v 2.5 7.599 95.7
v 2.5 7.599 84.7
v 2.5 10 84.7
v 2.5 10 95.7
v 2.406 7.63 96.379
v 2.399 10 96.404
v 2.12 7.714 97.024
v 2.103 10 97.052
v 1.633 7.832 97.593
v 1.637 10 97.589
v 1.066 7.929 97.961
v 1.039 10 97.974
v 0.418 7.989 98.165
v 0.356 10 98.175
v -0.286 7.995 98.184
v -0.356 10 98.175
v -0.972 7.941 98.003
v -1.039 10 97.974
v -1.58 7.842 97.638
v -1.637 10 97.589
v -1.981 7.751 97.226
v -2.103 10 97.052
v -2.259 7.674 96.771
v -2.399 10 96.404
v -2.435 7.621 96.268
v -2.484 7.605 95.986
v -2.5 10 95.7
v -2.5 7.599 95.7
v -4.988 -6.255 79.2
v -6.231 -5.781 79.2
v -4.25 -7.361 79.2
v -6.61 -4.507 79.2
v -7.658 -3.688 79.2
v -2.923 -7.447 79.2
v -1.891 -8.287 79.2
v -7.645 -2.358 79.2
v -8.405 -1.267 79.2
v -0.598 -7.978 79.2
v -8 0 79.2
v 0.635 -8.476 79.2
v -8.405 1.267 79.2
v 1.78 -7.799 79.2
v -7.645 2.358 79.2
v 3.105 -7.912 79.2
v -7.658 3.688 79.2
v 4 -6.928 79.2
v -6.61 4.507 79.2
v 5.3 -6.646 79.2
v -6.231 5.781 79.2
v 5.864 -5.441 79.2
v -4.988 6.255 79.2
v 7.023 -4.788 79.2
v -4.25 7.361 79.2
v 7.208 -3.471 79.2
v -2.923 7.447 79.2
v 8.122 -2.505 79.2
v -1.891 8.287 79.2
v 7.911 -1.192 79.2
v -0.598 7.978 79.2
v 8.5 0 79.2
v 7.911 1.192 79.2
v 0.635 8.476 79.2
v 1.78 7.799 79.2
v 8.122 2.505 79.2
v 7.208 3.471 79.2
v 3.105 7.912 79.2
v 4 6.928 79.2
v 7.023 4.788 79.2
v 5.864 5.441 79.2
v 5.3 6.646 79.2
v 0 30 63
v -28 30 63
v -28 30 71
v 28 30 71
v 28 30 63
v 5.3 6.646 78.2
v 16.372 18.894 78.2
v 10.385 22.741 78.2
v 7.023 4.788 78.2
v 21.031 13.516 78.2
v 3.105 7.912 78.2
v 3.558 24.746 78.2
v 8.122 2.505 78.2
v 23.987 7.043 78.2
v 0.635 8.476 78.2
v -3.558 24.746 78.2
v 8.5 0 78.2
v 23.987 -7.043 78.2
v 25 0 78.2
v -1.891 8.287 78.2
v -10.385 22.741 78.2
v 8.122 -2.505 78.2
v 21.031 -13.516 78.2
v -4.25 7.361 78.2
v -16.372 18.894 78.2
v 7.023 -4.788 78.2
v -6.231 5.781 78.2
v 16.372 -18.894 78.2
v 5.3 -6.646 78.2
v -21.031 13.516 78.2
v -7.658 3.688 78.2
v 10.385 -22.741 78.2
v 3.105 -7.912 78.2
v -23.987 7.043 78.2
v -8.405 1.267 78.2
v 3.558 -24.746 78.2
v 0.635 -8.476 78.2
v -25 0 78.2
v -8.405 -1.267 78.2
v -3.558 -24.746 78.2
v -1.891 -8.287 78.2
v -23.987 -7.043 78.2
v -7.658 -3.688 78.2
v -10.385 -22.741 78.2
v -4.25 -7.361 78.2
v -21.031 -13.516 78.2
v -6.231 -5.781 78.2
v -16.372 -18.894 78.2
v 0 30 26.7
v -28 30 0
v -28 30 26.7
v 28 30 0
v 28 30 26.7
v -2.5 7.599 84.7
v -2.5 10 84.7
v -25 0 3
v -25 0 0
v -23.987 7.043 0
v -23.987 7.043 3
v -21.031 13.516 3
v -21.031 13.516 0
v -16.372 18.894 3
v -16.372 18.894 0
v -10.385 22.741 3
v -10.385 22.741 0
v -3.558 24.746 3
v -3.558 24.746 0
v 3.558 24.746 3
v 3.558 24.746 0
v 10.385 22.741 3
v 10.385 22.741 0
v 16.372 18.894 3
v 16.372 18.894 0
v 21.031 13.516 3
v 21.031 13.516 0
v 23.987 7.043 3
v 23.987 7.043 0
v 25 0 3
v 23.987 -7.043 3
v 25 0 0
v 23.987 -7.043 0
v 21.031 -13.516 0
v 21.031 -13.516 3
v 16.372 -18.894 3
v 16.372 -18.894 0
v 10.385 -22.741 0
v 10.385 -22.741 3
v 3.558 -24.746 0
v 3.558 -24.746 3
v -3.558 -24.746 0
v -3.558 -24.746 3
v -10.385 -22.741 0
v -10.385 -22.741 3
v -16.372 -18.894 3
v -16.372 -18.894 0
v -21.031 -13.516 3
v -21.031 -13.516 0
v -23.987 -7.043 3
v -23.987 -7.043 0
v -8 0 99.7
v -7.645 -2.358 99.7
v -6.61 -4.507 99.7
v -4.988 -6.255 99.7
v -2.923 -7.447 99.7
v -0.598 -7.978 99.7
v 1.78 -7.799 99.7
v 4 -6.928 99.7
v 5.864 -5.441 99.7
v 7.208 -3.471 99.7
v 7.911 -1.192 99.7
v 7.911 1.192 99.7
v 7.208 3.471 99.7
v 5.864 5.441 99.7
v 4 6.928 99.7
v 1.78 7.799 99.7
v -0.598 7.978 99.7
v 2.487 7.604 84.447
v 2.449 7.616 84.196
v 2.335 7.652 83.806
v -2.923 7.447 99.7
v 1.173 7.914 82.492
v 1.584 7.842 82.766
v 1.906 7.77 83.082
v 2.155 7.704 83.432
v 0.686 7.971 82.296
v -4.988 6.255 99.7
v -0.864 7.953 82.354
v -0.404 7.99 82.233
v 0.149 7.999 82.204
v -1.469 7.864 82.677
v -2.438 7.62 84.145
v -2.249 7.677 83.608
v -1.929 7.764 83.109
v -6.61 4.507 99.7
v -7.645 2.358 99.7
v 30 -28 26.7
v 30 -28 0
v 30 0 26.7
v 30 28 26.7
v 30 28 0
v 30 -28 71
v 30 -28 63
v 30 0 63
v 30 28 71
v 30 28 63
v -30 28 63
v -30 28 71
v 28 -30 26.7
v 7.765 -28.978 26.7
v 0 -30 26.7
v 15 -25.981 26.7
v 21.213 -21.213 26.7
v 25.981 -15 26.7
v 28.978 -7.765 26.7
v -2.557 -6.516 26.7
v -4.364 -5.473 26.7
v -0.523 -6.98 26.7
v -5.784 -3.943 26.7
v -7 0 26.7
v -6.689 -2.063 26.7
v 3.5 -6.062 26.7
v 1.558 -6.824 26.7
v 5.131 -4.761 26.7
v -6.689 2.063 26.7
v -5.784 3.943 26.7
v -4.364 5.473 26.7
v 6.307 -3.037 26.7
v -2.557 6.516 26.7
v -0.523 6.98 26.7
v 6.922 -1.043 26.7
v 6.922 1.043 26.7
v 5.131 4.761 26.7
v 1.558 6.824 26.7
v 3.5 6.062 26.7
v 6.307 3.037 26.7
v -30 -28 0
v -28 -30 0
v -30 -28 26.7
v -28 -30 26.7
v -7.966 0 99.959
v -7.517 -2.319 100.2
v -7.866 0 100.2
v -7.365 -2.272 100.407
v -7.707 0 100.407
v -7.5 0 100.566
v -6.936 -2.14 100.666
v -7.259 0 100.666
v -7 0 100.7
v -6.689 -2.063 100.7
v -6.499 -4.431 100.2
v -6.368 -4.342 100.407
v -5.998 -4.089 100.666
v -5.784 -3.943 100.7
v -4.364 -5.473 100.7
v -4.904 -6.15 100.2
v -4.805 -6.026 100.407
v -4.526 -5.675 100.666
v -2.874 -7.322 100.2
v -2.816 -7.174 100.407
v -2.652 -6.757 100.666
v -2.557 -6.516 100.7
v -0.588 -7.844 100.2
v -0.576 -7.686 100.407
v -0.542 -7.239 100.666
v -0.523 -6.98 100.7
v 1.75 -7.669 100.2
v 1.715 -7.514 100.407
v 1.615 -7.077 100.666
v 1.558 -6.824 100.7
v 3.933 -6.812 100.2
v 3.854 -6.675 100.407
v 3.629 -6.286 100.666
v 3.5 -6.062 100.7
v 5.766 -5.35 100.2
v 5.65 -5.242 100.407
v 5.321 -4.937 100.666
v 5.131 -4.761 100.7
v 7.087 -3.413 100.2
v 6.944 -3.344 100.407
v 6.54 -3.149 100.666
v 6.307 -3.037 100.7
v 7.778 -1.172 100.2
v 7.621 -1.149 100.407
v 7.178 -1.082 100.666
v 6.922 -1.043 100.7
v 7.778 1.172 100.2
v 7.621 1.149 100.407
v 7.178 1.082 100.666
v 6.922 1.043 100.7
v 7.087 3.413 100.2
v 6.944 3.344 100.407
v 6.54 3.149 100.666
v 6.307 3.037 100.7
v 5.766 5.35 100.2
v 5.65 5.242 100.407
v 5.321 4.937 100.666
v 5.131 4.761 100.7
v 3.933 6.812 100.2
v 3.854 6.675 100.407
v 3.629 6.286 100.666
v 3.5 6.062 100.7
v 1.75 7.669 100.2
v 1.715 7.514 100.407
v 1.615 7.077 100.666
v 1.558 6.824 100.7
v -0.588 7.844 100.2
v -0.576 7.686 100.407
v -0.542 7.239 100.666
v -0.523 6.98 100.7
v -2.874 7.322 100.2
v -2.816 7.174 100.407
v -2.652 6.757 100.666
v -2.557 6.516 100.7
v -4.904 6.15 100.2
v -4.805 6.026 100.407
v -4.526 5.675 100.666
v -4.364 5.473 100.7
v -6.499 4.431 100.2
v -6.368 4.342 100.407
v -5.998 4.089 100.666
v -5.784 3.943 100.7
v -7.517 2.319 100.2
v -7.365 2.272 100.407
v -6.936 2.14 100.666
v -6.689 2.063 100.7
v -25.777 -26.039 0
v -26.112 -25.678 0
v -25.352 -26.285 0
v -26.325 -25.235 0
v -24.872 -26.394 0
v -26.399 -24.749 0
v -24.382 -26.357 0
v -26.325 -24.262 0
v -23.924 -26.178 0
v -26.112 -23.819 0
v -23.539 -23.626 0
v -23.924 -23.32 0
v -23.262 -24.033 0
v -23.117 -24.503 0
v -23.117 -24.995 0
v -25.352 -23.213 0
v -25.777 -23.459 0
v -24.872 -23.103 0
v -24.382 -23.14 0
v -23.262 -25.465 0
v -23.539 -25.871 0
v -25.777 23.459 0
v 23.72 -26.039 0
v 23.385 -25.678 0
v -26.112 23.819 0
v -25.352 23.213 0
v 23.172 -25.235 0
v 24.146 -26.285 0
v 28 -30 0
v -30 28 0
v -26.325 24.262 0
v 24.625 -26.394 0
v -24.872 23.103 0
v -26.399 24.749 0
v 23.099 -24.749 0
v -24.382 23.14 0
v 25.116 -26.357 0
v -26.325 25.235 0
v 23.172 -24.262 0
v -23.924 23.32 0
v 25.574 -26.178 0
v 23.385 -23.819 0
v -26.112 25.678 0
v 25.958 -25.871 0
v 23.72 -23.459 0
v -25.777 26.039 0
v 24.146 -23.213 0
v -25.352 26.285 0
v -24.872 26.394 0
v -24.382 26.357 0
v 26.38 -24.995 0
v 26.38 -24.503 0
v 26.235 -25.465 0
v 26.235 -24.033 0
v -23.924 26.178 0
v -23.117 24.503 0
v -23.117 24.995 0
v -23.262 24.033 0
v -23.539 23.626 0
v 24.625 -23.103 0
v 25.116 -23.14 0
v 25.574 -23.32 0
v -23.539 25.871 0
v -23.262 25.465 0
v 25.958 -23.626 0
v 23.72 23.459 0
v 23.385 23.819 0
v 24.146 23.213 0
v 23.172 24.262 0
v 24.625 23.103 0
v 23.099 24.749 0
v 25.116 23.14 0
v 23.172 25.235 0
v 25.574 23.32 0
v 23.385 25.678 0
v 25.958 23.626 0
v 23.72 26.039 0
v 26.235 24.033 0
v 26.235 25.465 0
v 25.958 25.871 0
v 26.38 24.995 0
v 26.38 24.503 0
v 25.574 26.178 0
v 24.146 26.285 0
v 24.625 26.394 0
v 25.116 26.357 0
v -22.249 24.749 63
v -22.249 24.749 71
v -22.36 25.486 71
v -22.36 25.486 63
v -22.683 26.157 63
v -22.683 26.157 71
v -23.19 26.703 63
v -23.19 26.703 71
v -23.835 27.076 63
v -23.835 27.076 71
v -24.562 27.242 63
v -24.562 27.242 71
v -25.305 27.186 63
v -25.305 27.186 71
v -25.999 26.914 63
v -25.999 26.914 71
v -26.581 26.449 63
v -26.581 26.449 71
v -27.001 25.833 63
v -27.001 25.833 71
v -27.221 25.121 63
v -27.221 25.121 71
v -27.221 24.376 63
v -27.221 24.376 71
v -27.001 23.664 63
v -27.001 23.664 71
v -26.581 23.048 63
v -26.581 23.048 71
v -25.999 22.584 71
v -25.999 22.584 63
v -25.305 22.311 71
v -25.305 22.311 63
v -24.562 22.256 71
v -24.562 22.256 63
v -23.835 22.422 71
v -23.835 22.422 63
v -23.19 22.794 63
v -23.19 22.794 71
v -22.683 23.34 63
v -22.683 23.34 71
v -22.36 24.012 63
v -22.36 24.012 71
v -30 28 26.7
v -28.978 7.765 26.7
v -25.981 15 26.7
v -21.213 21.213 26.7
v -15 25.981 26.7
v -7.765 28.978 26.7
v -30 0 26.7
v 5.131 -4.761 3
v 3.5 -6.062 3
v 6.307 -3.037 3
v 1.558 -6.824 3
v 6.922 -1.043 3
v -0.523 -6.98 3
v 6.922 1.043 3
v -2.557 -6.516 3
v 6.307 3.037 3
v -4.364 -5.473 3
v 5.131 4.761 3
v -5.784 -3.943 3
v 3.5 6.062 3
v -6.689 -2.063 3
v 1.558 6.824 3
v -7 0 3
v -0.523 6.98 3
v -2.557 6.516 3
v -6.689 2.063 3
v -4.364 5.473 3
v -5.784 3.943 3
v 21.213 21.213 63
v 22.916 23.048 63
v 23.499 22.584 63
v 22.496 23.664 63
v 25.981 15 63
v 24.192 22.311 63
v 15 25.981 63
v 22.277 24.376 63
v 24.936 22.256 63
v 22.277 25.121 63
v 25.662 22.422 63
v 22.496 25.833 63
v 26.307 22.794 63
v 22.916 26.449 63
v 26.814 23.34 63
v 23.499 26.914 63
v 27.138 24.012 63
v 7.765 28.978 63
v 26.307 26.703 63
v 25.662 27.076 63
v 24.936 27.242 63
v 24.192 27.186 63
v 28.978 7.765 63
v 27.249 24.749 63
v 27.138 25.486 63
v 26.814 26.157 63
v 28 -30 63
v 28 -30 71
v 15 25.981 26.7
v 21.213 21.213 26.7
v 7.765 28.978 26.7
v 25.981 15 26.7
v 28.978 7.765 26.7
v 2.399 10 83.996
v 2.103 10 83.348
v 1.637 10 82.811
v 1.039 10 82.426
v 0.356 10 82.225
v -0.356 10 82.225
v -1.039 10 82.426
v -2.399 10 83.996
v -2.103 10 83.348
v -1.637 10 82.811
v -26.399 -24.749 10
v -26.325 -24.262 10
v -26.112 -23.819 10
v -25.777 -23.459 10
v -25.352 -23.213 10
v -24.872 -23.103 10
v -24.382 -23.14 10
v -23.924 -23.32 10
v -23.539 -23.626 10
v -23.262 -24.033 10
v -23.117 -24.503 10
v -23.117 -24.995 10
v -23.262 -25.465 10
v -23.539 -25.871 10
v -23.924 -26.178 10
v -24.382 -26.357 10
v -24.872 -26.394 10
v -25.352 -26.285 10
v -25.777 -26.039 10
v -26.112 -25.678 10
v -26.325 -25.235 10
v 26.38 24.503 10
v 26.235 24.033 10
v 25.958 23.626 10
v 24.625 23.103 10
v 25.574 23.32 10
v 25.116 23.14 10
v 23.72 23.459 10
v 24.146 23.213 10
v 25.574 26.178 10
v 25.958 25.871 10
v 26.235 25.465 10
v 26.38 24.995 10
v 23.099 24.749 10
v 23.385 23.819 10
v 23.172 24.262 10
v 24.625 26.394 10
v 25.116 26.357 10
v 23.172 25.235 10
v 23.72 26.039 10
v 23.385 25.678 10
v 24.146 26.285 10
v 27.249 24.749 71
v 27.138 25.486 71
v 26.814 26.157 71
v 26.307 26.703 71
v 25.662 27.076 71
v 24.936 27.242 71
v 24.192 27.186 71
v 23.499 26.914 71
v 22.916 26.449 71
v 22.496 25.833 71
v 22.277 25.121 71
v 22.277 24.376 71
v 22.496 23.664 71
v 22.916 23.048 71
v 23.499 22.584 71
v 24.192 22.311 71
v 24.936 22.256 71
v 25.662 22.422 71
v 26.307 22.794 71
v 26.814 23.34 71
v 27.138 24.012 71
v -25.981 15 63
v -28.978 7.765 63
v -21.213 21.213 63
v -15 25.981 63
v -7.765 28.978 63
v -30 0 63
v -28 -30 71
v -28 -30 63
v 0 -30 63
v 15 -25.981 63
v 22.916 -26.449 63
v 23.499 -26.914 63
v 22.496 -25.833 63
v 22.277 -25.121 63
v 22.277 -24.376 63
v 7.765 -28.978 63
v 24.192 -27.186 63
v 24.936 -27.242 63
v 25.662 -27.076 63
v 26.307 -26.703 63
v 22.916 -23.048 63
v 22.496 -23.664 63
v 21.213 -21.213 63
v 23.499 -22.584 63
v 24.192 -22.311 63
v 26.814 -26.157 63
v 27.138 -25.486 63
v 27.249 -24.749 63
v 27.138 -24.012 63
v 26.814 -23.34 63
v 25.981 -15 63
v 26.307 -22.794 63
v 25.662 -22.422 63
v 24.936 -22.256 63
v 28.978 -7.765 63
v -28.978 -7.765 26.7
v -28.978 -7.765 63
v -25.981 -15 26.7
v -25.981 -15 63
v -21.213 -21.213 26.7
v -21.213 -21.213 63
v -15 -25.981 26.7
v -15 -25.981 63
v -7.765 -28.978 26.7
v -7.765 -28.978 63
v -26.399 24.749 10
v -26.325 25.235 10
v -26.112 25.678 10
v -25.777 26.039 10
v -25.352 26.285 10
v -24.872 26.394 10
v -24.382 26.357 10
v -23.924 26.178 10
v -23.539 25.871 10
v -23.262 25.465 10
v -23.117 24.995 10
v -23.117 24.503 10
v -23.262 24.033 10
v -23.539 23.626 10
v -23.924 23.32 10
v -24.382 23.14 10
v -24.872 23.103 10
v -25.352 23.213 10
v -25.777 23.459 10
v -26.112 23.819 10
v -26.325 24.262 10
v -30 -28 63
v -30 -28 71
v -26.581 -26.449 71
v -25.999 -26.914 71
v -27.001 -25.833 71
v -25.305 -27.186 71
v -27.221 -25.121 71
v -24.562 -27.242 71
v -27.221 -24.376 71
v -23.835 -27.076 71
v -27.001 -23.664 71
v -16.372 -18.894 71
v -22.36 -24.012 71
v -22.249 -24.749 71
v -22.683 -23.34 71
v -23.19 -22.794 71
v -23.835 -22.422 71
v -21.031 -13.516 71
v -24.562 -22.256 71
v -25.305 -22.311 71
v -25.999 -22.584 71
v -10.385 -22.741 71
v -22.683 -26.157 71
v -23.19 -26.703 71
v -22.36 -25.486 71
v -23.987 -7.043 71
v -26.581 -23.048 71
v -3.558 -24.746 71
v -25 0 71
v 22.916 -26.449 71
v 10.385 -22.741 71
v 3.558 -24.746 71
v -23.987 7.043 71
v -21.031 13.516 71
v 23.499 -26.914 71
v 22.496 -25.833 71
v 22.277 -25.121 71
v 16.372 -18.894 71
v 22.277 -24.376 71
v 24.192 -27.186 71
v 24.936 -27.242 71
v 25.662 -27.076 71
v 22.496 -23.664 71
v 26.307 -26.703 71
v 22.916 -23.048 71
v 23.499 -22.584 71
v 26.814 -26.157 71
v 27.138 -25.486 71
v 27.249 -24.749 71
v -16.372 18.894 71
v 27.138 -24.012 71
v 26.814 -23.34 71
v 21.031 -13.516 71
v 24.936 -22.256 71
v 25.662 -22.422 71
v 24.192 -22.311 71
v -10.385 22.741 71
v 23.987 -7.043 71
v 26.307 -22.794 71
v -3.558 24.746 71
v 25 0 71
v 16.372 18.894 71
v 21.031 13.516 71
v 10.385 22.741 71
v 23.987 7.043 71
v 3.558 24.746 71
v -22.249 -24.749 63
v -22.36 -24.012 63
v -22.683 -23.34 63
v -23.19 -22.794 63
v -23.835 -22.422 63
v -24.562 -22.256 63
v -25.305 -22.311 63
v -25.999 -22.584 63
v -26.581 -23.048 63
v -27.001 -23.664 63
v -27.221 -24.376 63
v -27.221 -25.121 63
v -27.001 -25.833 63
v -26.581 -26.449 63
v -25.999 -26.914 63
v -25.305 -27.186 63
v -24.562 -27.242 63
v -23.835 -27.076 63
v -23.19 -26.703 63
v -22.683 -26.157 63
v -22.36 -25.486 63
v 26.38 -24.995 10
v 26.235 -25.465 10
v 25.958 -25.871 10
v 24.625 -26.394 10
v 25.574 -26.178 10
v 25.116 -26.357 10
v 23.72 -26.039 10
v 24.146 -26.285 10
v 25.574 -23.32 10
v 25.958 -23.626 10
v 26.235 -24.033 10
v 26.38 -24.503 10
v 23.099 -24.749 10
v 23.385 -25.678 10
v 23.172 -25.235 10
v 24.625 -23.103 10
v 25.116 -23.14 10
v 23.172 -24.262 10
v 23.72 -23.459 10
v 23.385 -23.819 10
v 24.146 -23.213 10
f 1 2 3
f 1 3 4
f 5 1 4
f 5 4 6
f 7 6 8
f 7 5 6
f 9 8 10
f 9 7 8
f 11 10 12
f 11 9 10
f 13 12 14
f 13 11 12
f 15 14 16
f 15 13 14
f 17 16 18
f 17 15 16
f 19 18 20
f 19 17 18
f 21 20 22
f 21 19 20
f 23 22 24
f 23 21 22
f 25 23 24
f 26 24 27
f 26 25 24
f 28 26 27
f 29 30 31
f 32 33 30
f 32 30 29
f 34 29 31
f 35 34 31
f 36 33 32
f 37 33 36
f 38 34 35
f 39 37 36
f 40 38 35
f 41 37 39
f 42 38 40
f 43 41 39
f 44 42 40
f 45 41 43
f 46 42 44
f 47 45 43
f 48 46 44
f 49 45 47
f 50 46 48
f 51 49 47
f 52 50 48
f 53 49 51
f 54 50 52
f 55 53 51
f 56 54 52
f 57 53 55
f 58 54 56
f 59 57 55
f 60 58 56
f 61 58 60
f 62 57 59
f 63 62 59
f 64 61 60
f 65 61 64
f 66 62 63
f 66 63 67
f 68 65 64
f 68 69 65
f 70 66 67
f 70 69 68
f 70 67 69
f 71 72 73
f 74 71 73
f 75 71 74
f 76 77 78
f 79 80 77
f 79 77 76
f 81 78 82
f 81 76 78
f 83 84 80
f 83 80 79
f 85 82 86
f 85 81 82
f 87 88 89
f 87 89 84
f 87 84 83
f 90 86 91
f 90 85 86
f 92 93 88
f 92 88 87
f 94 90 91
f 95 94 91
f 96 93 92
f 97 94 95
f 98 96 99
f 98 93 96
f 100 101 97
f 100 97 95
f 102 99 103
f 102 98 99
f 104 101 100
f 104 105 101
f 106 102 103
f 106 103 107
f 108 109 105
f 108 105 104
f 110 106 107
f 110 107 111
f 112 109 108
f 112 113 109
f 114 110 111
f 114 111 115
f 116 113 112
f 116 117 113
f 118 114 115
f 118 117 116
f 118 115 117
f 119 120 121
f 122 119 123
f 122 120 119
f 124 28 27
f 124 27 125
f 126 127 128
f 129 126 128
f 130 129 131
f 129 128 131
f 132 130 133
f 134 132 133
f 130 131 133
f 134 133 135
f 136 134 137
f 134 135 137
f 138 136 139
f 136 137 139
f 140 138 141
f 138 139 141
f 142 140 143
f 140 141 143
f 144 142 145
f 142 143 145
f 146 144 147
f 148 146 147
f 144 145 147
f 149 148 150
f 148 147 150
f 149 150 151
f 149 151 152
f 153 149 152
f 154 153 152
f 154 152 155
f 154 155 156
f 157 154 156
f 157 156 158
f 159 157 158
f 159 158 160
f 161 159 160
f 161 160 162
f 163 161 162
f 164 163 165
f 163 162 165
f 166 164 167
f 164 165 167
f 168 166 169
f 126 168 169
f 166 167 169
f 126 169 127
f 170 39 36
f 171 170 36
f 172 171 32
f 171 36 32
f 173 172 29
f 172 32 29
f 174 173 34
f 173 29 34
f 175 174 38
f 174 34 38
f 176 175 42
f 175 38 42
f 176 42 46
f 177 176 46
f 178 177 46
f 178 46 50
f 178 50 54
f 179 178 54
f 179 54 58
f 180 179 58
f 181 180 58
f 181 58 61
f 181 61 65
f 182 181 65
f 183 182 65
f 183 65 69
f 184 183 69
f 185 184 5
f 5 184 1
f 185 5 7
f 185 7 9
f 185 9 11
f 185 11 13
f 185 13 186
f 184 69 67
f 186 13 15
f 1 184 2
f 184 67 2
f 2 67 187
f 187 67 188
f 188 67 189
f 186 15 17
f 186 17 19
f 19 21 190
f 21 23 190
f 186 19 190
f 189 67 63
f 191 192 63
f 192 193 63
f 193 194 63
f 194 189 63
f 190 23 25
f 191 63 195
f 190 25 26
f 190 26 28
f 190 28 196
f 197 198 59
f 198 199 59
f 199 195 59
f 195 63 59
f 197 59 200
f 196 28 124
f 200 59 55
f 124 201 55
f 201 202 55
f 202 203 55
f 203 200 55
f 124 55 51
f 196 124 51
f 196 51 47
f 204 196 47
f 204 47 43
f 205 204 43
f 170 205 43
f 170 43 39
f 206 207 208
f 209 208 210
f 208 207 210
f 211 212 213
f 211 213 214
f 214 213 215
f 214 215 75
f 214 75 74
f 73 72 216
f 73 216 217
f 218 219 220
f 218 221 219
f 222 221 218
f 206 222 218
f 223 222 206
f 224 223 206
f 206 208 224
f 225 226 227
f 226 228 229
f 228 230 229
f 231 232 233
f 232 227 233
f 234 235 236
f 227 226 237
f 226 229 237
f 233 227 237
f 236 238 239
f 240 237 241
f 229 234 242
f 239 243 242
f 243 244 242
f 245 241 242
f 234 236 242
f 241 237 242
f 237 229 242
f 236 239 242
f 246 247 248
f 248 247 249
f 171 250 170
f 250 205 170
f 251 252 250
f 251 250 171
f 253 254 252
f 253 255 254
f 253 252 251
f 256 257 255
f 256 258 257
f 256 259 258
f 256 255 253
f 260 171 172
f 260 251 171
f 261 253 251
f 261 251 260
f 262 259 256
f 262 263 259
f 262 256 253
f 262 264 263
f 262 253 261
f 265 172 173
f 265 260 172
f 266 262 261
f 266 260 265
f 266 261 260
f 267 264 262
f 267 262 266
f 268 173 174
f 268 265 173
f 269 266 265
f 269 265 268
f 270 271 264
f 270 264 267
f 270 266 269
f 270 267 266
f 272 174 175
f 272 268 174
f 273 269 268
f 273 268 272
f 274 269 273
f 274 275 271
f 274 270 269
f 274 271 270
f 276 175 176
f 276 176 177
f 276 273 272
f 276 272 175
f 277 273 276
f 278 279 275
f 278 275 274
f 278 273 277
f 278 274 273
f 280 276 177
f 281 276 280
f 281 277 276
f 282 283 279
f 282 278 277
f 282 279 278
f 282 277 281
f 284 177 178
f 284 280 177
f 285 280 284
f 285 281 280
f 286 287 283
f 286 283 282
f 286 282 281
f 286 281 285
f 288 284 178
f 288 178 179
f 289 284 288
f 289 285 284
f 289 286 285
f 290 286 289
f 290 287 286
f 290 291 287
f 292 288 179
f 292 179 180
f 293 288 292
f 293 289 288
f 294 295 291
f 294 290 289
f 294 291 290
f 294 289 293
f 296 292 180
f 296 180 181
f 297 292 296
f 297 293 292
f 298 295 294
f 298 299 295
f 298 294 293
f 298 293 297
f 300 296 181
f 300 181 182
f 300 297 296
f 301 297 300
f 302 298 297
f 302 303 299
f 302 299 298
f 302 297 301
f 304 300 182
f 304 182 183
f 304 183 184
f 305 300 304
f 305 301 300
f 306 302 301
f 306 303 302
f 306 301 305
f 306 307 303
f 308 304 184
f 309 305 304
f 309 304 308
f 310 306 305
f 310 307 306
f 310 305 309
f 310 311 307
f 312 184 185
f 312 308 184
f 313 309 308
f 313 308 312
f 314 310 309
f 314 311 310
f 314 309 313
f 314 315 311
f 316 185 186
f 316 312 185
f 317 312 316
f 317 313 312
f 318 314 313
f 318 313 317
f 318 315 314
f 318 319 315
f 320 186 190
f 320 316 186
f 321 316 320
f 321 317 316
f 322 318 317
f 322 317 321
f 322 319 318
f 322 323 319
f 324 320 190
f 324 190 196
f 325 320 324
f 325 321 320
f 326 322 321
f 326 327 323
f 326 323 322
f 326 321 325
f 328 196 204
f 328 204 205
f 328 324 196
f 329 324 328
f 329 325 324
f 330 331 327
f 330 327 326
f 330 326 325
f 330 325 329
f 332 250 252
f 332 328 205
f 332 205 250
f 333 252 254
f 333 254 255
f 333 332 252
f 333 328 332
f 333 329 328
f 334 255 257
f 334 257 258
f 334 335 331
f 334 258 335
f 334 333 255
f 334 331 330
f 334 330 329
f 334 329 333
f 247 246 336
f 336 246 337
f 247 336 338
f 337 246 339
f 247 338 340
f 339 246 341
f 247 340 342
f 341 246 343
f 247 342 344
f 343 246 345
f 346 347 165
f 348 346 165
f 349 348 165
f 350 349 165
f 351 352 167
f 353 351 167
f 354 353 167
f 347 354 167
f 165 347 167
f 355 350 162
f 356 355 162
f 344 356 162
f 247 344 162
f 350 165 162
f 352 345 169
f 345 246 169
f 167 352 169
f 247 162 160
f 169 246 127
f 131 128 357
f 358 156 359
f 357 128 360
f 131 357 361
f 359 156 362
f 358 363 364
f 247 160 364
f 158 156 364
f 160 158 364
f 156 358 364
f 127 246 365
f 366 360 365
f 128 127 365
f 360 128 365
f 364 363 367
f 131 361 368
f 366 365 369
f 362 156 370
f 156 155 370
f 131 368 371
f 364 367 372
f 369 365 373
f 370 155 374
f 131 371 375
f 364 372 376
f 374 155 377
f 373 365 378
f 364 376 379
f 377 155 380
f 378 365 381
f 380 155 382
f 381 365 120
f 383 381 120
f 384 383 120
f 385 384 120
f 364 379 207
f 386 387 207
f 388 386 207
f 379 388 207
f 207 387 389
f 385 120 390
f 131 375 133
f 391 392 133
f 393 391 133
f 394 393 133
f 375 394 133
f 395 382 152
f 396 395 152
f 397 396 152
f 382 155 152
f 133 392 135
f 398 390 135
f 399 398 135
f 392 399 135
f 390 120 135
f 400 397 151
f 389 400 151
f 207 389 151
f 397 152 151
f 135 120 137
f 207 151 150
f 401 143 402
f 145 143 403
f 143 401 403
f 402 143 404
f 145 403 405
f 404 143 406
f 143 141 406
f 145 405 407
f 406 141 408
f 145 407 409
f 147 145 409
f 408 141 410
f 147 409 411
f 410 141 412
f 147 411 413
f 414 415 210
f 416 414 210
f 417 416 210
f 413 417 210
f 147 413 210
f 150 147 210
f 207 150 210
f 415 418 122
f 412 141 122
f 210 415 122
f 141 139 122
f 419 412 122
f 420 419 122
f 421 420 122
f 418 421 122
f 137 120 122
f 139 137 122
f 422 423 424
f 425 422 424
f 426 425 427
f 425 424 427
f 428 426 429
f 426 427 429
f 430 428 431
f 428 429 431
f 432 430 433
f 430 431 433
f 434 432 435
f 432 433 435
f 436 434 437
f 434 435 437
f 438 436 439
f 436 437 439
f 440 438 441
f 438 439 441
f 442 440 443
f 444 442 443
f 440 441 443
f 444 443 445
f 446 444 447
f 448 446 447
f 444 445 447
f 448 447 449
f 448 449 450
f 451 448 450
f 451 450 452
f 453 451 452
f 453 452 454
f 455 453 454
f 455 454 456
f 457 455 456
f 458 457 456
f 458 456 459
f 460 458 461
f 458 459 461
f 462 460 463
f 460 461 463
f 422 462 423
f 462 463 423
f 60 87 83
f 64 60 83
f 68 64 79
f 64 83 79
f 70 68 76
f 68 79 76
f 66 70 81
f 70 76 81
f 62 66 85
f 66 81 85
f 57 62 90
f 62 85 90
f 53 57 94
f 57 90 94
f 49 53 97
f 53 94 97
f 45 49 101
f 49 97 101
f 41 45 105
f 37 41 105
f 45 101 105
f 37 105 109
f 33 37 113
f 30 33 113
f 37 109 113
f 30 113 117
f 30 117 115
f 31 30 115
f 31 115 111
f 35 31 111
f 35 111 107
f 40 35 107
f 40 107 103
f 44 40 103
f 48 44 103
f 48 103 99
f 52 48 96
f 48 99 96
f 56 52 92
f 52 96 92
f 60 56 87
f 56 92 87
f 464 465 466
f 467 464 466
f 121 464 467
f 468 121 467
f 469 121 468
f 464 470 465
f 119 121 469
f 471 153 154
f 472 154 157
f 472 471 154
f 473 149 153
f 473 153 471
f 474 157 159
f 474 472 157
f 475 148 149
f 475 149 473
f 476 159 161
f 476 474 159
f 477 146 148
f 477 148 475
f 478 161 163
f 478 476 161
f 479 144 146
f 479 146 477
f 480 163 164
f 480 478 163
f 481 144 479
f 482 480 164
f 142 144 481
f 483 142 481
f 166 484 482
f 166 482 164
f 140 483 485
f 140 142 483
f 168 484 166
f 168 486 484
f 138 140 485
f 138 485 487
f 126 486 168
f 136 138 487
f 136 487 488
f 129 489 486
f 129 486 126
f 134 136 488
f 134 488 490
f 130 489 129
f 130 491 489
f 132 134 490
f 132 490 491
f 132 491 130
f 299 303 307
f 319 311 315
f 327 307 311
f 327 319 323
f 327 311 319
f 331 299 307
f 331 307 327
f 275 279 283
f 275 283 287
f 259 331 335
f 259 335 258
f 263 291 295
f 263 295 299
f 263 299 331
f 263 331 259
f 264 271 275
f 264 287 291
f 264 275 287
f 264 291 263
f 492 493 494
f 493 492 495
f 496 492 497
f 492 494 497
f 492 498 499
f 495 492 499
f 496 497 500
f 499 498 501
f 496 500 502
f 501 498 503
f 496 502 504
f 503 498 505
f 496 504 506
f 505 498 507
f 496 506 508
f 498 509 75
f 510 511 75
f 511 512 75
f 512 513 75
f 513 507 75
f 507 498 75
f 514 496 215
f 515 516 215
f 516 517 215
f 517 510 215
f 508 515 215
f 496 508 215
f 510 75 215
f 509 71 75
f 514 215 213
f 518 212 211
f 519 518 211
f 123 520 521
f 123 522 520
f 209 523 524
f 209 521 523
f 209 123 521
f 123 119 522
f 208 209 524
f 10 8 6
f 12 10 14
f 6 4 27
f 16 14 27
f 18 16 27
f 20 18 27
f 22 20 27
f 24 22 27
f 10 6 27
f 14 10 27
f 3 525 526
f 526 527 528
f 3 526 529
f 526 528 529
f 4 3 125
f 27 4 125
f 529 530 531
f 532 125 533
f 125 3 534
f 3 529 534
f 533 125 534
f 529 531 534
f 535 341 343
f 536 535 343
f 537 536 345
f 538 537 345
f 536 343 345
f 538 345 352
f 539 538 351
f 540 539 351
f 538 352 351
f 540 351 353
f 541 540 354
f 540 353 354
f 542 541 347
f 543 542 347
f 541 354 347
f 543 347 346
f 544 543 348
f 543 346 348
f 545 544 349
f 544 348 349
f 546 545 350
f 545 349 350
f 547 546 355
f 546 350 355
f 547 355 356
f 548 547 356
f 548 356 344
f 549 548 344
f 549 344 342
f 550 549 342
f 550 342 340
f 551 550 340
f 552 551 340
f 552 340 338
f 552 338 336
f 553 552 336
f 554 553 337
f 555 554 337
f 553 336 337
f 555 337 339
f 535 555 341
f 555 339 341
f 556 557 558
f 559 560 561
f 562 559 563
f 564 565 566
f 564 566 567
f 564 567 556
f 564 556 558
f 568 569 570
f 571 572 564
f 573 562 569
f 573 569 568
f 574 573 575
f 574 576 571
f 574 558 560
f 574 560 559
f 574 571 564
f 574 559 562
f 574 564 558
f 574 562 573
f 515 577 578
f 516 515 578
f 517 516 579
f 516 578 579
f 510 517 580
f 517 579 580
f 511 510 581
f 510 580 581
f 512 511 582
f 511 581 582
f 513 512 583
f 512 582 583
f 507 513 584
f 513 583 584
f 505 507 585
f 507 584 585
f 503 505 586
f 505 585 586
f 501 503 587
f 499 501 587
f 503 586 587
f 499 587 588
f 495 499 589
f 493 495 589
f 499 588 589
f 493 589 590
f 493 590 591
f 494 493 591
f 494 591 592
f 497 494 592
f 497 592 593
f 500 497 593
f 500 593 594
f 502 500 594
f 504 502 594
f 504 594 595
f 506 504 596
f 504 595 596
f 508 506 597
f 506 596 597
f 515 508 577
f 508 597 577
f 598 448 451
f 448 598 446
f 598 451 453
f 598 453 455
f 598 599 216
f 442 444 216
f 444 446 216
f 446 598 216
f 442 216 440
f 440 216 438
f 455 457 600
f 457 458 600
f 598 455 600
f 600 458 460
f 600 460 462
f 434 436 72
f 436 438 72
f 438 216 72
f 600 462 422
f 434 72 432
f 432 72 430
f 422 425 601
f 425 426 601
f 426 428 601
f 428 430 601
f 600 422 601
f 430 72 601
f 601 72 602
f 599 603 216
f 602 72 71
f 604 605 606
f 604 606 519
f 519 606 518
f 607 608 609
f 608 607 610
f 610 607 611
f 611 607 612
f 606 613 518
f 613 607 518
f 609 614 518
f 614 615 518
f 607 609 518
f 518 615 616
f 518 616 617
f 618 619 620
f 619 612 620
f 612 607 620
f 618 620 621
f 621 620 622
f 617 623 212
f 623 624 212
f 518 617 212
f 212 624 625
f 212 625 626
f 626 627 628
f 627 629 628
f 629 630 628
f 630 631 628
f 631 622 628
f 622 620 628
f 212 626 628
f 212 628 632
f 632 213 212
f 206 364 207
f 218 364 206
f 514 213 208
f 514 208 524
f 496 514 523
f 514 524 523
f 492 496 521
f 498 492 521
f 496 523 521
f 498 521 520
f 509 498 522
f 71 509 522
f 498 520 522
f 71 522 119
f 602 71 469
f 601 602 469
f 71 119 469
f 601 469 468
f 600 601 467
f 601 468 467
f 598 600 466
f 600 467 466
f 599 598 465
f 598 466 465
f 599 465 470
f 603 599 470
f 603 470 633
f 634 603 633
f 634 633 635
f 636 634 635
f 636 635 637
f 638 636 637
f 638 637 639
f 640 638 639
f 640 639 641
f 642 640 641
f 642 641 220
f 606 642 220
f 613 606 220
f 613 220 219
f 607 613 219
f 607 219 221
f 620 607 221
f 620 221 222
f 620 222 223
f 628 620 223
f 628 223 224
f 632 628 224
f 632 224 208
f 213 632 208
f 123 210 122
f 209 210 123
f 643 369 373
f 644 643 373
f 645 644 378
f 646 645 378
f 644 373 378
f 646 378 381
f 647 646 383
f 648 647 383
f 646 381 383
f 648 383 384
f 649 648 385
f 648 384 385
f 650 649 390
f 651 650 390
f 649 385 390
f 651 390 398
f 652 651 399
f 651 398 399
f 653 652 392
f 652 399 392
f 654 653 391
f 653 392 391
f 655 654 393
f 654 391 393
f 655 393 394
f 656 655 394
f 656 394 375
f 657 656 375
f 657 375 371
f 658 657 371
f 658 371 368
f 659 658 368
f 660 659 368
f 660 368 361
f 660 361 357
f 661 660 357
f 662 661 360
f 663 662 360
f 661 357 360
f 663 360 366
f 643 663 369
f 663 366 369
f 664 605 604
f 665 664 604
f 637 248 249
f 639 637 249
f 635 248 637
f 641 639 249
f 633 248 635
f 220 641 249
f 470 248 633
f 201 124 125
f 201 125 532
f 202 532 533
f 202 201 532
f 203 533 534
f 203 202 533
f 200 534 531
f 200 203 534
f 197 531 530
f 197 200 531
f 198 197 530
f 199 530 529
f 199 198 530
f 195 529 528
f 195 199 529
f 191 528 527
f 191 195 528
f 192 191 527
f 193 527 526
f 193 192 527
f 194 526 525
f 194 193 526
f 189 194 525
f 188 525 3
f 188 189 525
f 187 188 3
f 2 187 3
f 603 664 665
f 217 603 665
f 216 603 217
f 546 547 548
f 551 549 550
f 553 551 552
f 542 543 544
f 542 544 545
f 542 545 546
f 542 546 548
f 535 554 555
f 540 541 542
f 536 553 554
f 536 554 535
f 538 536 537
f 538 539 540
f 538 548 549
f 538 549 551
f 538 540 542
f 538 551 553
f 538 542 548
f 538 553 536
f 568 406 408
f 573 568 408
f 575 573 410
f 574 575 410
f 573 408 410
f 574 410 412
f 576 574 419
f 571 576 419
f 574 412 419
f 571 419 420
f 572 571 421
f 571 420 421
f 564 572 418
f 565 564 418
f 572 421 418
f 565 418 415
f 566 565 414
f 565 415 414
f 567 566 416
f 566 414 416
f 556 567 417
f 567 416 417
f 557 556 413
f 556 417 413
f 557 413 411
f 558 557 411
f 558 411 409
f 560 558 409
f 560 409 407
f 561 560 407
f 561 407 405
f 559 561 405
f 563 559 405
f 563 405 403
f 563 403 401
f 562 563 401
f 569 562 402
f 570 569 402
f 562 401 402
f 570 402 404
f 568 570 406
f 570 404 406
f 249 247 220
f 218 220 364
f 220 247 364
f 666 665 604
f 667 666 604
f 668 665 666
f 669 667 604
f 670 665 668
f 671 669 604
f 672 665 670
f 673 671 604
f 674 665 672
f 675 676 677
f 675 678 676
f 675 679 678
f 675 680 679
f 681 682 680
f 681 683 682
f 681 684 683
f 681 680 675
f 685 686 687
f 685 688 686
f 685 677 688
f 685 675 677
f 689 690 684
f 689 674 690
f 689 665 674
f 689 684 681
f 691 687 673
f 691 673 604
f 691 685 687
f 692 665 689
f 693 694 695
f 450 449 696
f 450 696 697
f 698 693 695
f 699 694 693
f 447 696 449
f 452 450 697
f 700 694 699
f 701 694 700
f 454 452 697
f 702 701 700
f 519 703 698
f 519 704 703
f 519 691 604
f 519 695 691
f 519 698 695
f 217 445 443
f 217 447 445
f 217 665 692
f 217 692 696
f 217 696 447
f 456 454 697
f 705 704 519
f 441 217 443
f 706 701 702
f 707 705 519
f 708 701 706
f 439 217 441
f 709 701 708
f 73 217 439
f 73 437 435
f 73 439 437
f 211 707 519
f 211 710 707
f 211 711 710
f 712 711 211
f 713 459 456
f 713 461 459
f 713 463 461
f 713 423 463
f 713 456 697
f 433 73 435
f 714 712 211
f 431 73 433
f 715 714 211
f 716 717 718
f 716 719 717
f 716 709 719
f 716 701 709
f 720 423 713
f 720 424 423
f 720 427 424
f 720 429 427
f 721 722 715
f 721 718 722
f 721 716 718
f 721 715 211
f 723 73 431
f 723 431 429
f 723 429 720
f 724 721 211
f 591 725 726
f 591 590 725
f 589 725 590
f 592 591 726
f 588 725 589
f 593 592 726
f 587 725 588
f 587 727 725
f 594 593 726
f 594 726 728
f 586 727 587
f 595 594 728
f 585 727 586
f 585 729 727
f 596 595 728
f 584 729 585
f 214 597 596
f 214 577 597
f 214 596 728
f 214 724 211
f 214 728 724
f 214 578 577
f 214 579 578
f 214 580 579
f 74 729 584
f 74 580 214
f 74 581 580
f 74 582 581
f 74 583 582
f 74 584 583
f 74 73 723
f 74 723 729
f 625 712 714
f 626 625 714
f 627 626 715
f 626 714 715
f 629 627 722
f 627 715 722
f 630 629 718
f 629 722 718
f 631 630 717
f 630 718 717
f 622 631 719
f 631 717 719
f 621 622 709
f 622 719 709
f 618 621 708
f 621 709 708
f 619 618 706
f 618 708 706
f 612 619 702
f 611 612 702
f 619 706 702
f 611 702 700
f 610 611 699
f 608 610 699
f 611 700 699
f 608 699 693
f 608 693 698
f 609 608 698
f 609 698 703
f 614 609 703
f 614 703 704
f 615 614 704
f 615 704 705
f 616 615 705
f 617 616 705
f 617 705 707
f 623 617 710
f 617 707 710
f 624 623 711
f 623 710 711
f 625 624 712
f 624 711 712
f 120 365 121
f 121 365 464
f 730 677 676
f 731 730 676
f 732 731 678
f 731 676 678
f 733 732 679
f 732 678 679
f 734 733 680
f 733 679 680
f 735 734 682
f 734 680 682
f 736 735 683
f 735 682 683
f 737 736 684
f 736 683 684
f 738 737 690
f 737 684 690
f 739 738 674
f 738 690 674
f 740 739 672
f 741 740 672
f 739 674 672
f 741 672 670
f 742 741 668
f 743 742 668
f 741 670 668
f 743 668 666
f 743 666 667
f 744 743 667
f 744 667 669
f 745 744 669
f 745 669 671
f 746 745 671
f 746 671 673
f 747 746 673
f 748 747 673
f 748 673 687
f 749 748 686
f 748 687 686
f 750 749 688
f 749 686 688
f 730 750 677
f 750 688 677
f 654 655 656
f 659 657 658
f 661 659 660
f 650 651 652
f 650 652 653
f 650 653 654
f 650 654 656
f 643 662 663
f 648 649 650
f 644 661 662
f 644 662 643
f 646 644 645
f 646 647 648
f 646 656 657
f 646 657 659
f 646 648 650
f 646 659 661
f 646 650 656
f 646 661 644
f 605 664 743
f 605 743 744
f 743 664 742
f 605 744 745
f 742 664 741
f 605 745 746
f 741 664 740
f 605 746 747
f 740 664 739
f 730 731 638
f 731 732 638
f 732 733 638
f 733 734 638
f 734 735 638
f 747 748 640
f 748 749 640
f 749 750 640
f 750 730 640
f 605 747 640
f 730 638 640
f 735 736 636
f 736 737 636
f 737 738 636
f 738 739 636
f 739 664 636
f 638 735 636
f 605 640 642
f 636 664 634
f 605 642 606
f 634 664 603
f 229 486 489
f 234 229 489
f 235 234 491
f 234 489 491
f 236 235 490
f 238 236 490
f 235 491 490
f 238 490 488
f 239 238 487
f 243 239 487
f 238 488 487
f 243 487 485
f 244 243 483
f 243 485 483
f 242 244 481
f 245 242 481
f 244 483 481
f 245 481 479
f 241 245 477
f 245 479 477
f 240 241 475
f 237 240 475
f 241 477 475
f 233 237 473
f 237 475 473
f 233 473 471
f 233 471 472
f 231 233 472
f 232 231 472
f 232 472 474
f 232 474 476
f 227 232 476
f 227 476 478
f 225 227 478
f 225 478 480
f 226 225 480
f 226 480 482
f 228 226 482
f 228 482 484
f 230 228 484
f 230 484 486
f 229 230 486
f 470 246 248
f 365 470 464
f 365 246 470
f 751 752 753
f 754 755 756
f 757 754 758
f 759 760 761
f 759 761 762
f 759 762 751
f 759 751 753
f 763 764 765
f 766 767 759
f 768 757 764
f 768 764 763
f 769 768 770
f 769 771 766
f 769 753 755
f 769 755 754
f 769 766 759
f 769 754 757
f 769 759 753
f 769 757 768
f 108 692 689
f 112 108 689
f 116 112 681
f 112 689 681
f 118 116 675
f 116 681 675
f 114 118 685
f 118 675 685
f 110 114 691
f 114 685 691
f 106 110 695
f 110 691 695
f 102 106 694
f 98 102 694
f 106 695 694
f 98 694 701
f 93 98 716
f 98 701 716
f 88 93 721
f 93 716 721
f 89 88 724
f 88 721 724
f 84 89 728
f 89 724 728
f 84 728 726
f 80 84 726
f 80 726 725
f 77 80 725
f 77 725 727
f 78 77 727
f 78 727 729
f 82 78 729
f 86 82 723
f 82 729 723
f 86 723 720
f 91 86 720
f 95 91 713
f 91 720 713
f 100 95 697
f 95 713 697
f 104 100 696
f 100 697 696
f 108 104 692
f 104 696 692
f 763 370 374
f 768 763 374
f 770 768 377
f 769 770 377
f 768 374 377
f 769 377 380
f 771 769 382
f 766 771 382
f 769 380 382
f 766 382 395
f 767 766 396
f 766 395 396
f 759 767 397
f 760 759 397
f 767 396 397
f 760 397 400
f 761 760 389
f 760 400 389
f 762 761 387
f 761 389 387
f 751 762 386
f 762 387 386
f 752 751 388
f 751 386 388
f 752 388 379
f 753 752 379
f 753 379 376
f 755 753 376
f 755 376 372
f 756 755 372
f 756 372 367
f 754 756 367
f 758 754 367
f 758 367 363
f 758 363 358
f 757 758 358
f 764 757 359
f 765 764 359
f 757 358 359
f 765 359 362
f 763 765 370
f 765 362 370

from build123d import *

# Parameters (mm, degrees)
SKETCH_1_W          = 60
SKETCH_1_H          = 60
EXTRUDE_1_DEPTH     = 26.7
SKETCH_2_R          = 25
CUT_EXTRUDE_1_DEPTH = 3
SKETCH_3_R          = 7
CUT_EXTRUDE_2_DEPTH = 49.597222143
SKETCH_4_R          = 1.65
CUT_EXTRUDE_3_DEPTH = 10
SKETCH_5_R          = 30
EXTRUDE_2_DEPTH     = 36.3
SKETCH_6_W          = 60
SKETCH_6_H          = 60
EXTRUDE_3_DEPTH     = 8
SKETCH_7_R          = 25
EXTRUDE_4_DEPTH     = 7.2
SKETCH_8_R          = 8
EXTRUDE_5_DEPTH     = 22.5
SKETCH_9_R          = 2.5
CUT_EXTRUDE_4_DEPTH = 8
EXTRUDE_6_DEPTH     = 10
CHAMFER_1_SIZE      = 2
FILLET_1_R          = 1
SKETCH_11_R         = 8.5
EXTRUDE_7_DEPTH     = 1


with BuildPart() as part:
    # 草图1 → 凸台-拉伸1 (new body)
    with BuildSketch(Plane.XY):
        Rectangle(SKETCH_1_W, SKETCH_1_H)
    extrude(amount=EXTRUDE_1_DEPTH)

    # 草图2 → 切除-拉伸1 (cut)
    with BuildSketch(Plane(origin=(0, 0, 0), x_dir=(-1, 0, 0), z_dir=(0, 0, -1))):
        Circle(SKETCH_2_R)
    extrude(amount=-CUT_EXTRUDE_1_DEPTH, mode=Mode.SUBTRACT)

    # 草图3 → 切除-拉伸2 (cut, through all)
    with BuildSketch(Plane(origin=(0, 0, 3), x_dir=(-1, 0, 0), z_dir=(0, 0, -1))):
        Circle(SKETCH_3_R)
    extrude(amount=-CUT_EXTRUDE_2_DEPTH, mode=Mode.SUBTRACT)

    # 草图4 → 切除-拉伸3 (cut)
    with BuildSketch(Plane(origin=(0, 0, 0), x_dir=(-1, 0, 0), z_dir=(0, 0, -1))):
        with Locations((24.748737342, 24.748737342)):
            Circle(SKETCH_4_R)
        with Locations((-24.748737342, 24.748737342)):
            Circle(SKETCH_4_R)
        with Locations((24.748737342, -24.748737342)):
            Circle(SKETCH_4_R)
        with Locations((-24.748737342, -24.748737342)):
            Circle(SKETCH_4_R)
    extrude(amount=-CUT_EXTRUDE_3_DEPTH, mode=Mode.SUBTRACT)

    # 草图5 → 凸台-拉伸2 (add)
    with BuildSketch(Plane.XY.offset(26.7)):
        Circle(SKETCH_5_R)
    extrude(amount=EXTRUDE_2_DEPTH)

    # 草图6 → 凸台-拉伸3 (add)
    with BuildSketch(Plane.XY.offset(63)):
        Rectangle(SKETCH_6_W, SKETCH_6_H)
    extrude(amount=EXTRUDE_3_DEPTH)

    # 草图7 → 凸台-拉伸4 (add)
    with BuildSketch(Plane.XY.offset(71)):
        with Locations(Location((0, 0, 0), (0, 0, 180))):
            Circle(SKETCH_7_R)
    extrude(amount=EXTRUDE_4_DEPTH)

    # 草图8 → 凸台-拉伸5 (add)
    with BuildSketch(Plane.XY.offset(78.2)):
        with Locations(Location((0, 0, 0), (0, 0, 180))):
            Circle(SKETCH_8_R)
    extrude(amount=EXTRUDE_5_DEPTH)

    # 草图9 → 切除-拉伸4 (cut)
    with BuildSketch(Plane.XY.offset(71)):
        with Locations((-24.748737342, 24.748737342)):
            Circle(SKETCH_9_R)
        with Locations((24.748737342, 24.748737342)):
            Circle(SKETCH_9_R)
        with Locations((24.748737342, -24.748737342)):
            Circle(SKETCH_9_R)
        with Locations((-24.748737342, -24.748737342)):
            Circle(SKETCH_9_R)
    extrude(amount=-CUT_EXTRUDE_4_DEPTH, mode=Mode.SUBTRACT)

    # 草图10 → 凸台-拉伸6 (add)
    with BuildSketch(Plane(origin=(0, 0, 0), x_dir=(1, 0, 0), z_dir=(0, 1, 0))):
        with BuildLine():
            Line((2.5, -84.7), (2.5, -95.7))
            ThreePointArc((2.5, -95.7), (0, -98.2), (-2.5, -95.7))
            Line((-2.5, -95.7), (-2.5, -84.7))
            ThreePointArc((-2.5, -84.7), (0, -82.2), (2.5, -84.7))
        make_face()
    extrude(amount=EXTRUDE_6_DEPTH)

    # 倒角1
    chamfer_1_edges = [part.edges().sort_by_distance(p)[0] for p in [
        (-30, 30, 67),
        (-30, -30, 67),
        (30, -30, 67),
        (30, 30, 67),
        (30, -30, 13.35),
        (-30, -30, 13.35),
        (-30, 30, 13.35),
        (30, 30, 13.35),
    ]]
    chamfer(chamfer_1_edges, length=CHAMFER_1_SIZE)

    # 圆角1
    fillet_1_edges = [part.edges().sort_by_distance(p)[0] for p in [
        (8, 0, 100.7),
    ]]
    fillet(fillet_1_edges, radius=FILLET_1_R)

    # 草图11 → 凸台-拉伸7 (add)
    with BuildSketch(Plane.XY.offset(78.2)):
        Circle(SKETCH_11_R)
    extrude(amount=EXTRUDE_7_DEPTH)


solid = part.part
